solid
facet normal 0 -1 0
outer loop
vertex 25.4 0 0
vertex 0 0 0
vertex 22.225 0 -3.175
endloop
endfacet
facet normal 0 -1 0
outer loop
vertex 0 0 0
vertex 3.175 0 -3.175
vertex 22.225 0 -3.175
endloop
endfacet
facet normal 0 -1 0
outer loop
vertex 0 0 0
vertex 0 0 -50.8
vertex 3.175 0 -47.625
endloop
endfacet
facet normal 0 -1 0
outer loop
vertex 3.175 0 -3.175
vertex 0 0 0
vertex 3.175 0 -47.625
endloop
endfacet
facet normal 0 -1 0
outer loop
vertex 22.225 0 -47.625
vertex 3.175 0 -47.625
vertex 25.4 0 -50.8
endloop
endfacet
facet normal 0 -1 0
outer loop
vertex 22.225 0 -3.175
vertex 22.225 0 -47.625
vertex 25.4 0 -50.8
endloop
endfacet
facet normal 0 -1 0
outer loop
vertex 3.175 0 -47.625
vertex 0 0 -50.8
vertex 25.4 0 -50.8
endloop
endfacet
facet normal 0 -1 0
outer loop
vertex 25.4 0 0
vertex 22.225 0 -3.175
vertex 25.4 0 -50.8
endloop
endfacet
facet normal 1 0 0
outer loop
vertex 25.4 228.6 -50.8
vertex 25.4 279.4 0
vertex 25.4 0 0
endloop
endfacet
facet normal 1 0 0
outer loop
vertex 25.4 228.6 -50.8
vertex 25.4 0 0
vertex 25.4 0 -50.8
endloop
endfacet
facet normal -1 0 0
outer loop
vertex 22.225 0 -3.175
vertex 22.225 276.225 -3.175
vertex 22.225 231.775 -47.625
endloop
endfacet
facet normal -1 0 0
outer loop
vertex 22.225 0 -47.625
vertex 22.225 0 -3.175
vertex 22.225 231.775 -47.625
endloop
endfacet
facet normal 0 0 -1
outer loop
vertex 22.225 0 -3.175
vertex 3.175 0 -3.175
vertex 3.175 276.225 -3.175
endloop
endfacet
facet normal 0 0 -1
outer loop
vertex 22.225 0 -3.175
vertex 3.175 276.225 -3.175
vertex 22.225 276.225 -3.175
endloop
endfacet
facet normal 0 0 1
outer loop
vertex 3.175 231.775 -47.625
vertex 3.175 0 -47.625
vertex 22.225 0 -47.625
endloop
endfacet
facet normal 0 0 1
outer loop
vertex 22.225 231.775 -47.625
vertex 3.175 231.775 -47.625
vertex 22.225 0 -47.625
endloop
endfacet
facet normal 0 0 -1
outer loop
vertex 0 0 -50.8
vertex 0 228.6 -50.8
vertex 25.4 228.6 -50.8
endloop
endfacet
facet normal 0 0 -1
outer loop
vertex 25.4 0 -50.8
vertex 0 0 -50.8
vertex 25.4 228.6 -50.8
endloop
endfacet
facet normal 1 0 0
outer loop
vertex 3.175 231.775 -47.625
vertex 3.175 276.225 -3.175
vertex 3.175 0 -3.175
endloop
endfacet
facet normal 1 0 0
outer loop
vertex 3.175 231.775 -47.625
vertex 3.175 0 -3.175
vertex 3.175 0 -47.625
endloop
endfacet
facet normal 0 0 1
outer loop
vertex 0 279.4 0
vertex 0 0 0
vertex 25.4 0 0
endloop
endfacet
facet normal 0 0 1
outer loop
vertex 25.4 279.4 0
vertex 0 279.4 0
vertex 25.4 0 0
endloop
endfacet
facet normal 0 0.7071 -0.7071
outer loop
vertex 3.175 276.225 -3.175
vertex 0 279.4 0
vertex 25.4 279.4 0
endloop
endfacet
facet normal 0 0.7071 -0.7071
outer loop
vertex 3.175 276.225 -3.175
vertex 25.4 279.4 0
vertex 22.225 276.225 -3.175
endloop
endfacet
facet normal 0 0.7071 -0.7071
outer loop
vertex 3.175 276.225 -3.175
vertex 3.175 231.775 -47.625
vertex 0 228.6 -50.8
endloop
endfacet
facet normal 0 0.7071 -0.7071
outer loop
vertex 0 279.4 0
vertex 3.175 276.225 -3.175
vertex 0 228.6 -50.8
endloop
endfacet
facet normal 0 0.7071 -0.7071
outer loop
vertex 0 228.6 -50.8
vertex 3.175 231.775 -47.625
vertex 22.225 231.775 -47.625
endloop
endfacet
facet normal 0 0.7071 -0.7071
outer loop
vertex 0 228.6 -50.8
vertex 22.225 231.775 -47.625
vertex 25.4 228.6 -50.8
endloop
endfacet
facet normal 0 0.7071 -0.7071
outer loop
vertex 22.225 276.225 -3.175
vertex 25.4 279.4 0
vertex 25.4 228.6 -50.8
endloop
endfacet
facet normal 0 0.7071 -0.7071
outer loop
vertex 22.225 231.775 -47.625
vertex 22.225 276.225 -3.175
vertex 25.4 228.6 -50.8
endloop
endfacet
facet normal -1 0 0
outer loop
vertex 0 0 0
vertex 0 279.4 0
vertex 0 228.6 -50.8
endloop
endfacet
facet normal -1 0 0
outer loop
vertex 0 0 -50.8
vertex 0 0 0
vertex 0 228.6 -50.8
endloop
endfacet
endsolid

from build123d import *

# Parameters (mm, degrees)
SKETCH1_W           = 25.4
SKETCH1_H           = 50.8
SKETCH1_W_2         = 19.05
SKETCH1_H_2         = 44.45
BOSS_EXTRUDE1_DEPTH = 279.4
CUT_EXTRUDE1_DEPTH  = 279.4


with BuildPart() as part:
    # Sketch1 → Boss-Extrude1 (new body)
    with BuildSketch(Plane(origin=(0, 0, 0), x_dir=(1, 0, 0), z_dir=(0, 1, 0))):
        with Locations((12.7, 25.4)):
            Rectangle(SKETCH1_W, SKETCH1_H)
        with Locations((12.7, 25.4)):
            Rectangle(SKETCH1_W_2, SKETCH1_H_2, mode=Mode.SUBTRACT)
    extrude(amount=BOSS_EXTRUDE1_DEPTH)

    # Sketch2 → Cut-Extrude1 (cut)
    with BuildSketch(Plane(origin=(25.4, 0, 0), x_dir=(0, 0, -1), z_dir=(1, 0, 0))):
        Polygon((0, 279.4), (50.8, 228.6), (50.8, 279.4), align=None)
    extrude(amount=-CUT_EXTRUDE1_DEPTH, mode=Mode.SUBTRACT)


solid = part.part
